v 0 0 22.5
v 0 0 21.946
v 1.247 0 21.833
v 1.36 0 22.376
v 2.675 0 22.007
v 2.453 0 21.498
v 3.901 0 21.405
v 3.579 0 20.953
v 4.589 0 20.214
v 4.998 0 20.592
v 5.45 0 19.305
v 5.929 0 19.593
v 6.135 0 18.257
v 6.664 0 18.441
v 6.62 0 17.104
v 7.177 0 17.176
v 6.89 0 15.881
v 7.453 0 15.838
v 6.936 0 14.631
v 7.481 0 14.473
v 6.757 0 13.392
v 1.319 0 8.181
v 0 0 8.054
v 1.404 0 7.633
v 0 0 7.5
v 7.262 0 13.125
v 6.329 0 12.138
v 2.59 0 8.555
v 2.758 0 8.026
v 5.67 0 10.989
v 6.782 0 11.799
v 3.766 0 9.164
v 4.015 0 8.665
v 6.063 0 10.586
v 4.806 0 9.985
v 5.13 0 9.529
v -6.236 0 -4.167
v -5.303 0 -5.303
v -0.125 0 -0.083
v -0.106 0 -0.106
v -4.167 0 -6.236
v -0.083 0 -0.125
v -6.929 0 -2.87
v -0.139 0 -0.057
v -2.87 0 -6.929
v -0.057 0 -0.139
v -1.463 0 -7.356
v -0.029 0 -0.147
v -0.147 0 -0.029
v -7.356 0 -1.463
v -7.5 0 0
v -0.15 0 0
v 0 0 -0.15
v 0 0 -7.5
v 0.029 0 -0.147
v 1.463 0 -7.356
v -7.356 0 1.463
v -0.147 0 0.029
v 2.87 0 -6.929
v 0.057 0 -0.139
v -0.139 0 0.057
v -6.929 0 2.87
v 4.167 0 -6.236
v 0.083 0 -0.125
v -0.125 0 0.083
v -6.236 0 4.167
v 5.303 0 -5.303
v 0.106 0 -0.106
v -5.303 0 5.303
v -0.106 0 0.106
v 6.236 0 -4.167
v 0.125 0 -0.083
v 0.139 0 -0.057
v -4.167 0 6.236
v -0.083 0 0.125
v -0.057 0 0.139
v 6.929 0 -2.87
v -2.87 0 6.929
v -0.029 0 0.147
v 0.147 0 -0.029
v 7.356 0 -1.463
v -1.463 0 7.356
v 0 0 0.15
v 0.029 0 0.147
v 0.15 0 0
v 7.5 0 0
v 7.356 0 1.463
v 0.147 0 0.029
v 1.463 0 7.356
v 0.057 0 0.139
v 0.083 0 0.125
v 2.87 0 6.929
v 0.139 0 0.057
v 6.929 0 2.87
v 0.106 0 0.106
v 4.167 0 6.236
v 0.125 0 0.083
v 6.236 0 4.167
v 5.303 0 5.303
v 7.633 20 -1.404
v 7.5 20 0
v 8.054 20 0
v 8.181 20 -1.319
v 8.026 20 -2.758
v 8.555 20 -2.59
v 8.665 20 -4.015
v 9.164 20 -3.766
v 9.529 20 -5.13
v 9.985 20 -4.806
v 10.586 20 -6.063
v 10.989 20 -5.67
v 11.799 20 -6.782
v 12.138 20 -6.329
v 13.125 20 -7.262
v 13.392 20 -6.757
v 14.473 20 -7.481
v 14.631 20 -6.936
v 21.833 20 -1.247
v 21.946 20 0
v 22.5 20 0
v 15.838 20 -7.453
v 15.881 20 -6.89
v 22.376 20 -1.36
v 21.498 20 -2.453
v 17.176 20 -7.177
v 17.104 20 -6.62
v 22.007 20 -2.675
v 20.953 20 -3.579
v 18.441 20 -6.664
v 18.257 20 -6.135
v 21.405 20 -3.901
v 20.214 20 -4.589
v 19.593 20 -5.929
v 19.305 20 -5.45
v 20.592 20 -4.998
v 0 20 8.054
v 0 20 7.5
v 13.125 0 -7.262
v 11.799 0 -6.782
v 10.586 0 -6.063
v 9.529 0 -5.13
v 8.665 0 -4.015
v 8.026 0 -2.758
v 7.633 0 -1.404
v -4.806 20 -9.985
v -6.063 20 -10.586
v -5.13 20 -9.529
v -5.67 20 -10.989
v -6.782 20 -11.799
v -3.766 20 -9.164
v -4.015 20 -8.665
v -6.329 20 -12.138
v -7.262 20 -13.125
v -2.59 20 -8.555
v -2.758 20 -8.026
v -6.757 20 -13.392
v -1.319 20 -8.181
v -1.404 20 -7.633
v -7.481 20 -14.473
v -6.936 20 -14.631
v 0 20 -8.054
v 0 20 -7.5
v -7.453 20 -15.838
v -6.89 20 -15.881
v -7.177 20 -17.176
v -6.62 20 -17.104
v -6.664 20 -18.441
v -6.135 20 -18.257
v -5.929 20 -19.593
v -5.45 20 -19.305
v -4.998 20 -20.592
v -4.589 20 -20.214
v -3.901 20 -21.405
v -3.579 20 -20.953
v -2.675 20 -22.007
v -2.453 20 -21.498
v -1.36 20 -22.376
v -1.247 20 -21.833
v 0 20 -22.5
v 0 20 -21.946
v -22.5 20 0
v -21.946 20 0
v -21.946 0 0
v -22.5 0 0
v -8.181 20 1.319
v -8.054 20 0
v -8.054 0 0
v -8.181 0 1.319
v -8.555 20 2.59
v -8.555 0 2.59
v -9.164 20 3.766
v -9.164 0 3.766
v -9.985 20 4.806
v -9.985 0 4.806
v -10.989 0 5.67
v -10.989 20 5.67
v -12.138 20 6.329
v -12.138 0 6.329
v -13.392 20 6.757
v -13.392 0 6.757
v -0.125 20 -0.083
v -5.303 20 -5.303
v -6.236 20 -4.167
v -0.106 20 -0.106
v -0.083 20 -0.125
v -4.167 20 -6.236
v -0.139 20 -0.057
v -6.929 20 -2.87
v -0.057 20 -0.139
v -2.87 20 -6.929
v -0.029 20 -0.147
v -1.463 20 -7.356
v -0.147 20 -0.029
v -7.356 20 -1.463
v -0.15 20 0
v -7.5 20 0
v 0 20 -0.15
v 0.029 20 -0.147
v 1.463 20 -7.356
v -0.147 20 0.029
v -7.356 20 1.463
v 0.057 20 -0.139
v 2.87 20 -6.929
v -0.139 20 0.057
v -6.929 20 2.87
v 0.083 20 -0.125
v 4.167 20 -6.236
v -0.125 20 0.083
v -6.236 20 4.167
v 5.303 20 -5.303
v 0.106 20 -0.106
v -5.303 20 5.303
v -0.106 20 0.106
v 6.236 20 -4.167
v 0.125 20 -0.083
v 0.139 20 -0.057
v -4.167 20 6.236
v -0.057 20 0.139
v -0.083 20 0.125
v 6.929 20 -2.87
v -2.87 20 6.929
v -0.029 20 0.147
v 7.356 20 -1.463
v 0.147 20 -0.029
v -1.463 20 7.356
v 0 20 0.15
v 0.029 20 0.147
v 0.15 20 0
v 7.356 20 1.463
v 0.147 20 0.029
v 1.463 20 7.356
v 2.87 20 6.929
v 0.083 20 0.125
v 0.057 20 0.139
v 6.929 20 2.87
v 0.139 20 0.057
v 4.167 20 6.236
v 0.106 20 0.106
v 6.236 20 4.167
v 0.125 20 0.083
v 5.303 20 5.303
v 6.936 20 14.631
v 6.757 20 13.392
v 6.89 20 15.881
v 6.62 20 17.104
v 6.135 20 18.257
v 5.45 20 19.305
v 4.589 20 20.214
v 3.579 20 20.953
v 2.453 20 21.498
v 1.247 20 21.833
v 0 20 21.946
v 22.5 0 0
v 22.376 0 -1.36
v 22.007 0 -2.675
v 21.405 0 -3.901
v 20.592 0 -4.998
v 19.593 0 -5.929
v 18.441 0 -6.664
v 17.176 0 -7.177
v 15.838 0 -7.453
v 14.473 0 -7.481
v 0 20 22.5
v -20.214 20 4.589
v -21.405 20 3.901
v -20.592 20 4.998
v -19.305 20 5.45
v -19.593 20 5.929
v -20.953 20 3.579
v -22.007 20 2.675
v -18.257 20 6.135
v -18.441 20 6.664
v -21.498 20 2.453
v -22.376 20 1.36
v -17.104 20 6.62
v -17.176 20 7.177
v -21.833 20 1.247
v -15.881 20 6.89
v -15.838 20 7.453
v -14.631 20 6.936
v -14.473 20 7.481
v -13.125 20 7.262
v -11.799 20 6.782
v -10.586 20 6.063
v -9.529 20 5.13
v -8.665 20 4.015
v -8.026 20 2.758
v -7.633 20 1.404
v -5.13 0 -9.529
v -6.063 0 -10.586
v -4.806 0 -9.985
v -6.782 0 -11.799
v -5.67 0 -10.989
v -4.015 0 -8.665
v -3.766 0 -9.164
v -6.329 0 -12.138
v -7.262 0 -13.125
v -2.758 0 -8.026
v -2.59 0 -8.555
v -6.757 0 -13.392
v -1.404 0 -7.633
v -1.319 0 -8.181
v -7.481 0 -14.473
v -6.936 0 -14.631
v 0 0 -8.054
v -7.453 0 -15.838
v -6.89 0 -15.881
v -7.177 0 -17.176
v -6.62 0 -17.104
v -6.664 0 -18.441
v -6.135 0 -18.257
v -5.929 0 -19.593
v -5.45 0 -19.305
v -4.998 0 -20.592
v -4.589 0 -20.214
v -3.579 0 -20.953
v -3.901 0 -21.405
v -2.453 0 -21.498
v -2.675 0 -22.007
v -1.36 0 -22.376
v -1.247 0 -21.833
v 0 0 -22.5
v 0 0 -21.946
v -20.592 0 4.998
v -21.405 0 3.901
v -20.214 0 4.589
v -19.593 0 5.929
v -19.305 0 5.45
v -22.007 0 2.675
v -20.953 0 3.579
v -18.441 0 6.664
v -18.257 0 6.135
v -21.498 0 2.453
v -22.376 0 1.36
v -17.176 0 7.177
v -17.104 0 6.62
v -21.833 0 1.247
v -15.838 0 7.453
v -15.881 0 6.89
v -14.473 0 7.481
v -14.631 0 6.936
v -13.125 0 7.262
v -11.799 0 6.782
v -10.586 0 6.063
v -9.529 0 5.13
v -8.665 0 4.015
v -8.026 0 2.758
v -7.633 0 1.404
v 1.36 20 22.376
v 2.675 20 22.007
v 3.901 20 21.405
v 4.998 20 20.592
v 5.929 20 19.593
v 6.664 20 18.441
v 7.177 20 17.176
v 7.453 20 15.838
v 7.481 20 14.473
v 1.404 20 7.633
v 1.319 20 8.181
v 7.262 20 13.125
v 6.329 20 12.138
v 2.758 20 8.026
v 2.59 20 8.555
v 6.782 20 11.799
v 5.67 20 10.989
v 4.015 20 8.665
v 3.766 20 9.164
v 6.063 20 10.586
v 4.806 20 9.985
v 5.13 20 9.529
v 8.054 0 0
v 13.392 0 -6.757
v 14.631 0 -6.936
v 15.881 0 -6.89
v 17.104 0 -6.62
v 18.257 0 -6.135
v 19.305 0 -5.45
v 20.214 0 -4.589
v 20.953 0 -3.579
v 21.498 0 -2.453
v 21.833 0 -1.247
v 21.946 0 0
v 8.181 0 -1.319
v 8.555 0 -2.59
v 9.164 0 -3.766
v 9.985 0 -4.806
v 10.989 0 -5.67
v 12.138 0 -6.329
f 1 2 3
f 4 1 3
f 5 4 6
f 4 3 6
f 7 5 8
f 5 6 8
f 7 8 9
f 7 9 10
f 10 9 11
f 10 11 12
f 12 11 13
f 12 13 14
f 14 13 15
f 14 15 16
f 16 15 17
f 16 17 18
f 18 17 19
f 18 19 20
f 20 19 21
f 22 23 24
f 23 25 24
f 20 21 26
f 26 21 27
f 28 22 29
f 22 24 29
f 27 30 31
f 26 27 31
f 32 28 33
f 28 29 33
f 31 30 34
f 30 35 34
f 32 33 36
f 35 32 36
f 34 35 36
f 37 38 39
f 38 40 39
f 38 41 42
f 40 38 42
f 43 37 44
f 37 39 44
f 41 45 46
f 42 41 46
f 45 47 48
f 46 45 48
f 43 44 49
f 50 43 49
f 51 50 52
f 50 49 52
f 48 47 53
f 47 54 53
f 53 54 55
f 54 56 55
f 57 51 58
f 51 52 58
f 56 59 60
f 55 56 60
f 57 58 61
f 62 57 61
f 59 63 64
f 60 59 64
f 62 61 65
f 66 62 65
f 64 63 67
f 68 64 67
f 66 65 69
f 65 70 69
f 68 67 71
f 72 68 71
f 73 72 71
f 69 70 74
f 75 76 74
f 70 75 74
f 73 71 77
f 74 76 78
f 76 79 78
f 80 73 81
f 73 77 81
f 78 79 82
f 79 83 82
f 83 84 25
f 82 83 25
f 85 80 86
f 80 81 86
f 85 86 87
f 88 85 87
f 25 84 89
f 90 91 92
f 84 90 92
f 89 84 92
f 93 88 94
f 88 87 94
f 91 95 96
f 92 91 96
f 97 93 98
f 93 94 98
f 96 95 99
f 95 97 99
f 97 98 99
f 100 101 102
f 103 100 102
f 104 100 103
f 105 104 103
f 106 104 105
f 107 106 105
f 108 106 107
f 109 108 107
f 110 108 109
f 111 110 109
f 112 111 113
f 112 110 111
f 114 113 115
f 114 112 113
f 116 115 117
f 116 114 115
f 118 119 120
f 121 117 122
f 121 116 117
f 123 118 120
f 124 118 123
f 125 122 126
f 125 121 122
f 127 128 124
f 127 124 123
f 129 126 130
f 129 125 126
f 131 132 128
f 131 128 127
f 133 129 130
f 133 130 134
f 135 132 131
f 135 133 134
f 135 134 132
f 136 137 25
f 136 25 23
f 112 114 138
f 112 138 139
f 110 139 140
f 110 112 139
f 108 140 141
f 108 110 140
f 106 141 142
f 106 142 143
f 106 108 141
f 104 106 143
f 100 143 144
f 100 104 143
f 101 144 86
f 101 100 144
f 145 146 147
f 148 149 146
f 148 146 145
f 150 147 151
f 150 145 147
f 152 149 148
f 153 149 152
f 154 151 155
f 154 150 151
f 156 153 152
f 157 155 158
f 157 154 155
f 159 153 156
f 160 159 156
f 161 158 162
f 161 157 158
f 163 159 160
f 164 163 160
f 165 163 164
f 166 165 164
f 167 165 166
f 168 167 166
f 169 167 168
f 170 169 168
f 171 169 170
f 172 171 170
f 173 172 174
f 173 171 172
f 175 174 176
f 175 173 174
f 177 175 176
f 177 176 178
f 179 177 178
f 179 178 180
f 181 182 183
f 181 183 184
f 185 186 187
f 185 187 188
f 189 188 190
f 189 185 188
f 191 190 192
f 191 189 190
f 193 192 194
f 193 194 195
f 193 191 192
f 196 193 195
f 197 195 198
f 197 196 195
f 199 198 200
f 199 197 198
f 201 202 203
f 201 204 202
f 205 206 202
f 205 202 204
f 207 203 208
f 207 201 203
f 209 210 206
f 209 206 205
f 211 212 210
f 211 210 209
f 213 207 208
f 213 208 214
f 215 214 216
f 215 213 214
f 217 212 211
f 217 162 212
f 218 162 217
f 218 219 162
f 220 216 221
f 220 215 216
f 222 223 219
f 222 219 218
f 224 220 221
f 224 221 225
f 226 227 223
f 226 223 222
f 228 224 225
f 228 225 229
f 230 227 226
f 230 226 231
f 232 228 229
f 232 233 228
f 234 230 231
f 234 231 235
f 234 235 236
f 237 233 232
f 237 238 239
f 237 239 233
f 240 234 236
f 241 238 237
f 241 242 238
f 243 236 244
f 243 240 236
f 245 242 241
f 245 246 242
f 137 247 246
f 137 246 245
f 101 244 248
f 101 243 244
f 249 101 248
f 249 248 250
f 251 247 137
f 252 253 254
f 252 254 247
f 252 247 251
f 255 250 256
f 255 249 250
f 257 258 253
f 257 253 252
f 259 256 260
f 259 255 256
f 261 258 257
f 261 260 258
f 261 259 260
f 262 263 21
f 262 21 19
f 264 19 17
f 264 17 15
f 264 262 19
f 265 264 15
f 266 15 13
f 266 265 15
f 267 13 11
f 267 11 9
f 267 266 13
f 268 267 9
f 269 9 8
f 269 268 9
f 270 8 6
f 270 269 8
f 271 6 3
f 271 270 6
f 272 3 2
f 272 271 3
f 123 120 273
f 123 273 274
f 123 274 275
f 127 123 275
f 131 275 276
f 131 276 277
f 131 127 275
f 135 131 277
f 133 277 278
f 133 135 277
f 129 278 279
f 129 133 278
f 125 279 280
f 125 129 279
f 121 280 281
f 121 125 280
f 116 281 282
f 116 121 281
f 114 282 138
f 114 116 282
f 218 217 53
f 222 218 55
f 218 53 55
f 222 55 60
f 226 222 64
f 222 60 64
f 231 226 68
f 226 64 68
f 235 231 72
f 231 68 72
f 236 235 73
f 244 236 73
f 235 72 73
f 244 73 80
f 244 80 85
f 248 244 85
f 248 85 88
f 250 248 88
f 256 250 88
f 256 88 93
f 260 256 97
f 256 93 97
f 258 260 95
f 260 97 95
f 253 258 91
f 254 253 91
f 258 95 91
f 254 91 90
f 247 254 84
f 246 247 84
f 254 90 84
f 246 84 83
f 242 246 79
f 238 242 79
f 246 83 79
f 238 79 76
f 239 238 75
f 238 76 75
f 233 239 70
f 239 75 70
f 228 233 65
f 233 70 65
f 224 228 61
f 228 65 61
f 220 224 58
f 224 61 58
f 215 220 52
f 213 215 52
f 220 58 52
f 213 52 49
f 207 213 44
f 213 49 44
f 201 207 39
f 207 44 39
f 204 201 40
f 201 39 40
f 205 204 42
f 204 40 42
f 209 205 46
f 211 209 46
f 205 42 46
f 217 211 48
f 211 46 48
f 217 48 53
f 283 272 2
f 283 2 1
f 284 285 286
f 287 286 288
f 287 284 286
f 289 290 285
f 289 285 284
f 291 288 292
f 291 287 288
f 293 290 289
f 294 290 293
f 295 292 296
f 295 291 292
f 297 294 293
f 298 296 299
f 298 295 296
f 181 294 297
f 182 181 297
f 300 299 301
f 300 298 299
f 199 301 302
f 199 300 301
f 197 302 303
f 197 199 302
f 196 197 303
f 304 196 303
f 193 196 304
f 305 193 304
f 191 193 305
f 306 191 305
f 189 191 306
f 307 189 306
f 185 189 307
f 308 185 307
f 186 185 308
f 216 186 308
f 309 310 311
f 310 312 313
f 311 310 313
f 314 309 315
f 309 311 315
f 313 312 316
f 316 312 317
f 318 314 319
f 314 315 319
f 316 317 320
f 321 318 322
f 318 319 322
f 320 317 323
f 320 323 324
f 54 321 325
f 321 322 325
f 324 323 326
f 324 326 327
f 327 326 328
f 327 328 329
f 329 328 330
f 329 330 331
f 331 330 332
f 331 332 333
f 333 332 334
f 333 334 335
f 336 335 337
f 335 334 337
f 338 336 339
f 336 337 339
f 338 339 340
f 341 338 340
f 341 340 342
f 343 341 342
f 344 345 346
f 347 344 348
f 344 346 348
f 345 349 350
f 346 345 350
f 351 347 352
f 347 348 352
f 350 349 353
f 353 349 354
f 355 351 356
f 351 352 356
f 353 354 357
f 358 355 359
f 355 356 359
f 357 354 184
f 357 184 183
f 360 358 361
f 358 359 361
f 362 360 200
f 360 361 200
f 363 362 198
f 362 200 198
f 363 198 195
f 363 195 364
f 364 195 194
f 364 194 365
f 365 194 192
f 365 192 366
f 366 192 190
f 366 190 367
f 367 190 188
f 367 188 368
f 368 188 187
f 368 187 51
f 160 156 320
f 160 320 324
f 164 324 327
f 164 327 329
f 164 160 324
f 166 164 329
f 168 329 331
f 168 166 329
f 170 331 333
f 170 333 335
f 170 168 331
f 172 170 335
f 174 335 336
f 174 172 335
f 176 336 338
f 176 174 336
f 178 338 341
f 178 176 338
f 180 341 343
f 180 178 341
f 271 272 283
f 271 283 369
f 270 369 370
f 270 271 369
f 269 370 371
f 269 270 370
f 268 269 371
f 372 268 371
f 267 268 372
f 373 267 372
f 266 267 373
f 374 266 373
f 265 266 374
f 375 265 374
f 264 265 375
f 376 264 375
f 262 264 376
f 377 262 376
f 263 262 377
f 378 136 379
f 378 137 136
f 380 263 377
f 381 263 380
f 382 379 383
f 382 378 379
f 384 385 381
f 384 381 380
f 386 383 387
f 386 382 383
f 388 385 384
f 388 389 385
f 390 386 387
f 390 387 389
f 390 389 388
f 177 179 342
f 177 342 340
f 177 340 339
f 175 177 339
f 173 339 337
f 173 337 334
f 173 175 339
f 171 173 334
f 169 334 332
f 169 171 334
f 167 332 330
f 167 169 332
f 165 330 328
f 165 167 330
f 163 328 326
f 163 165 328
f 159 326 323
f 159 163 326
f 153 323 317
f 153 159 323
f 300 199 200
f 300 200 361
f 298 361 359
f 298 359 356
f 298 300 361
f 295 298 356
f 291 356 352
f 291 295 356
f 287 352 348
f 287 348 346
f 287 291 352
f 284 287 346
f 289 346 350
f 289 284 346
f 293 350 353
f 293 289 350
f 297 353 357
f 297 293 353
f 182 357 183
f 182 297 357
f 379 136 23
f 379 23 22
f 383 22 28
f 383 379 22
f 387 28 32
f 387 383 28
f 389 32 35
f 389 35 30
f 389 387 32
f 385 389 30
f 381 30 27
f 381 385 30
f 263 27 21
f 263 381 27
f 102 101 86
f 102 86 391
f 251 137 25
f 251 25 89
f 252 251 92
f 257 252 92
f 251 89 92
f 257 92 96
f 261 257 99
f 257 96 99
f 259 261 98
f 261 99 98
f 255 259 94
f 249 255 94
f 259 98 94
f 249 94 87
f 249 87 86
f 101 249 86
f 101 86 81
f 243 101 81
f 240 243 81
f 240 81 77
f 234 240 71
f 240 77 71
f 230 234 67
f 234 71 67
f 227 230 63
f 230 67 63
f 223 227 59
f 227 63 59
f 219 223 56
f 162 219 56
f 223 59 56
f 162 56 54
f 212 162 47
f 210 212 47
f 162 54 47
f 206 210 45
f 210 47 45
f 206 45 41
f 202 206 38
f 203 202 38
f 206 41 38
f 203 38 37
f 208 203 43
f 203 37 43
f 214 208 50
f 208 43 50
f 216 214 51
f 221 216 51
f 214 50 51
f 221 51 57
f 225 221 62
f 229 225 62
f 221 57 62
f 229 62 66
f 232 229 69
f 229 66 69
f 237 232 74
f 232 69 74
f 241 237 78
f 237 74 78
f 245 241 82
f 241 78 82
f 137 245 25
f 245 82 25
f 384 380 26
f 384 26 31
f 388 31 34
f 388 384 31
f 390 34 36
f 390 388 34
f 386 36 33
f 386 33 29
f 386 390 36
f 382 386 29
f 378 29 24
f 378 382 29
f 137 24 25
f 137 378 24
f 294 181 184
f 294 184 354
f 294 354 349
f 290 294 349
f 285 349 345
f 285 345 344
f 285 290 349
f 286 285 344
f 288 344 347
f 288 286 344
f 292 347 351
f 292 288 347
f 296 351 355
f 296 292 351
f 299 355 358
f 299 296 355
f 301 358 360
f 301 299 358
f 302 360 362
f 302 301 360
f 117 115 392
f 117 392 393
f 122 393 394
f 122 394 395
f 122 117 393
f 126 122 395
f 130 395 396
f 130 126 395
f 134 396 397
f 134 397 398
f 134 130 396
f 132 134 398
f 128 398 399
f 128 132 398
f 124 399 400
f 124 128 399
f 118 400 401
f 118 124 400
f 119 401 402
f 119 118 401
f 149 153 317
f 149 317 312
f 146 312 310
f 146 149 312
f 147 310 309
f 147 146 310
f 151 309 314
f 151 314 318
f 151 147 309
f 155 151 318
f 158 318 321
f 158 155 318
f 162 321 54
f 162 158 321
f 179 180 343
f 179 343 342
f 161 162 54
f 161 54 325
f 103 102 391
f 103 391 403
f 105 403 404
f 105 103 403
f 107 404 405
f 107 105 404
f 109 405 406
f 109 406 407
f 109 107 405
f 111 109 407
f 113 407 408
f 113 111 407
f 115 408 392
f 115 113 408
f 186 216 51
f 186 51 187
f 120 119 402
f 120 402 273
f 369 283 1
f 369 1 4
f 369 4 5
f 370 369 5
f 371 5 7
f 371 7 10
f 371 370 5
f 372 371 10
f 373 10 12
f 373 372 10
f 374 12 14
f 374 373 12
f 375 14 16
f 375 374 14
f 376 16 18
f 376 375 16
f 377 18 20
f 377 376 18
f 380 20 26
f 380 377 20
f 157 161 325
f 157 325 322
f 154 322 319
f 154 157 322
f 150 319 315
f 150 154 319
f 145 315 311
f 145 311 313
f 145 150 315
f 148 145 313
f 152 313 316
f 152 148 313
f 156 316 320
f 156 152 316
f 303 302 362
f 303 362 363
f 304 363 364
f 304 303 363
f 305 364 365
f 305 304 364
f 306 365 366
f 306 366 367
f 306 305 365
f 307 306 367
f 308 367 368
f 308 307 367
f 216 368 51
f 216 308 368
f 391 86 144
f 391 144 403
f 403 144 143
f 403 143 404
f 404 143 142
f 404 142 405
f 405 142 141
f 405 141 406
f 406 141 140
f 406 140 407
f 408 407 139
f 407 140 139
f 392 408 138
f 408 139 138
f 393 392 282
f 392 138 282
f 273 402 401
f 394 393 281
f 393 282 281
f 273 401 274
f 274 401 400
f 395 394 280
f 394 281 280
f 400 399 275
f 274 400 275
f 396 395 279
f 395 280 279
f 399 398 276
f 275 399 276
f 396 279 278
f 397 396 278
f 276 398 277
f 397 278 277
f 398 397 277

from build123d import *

# Parameters (mm, degrees)
SKETCH1_R           = 7.5
BOSS_EXTRUDE1_DEPTH = 20
SKETCH2_R           = 0.15
CUT_EXTRUDE2_DEPTH  = 20
BOSS_EXTRUDE3_DEPTH = 20


with BuildPart() as part:
    # Sketch1 → Boss-Extrude1 (new body)
    with BuildSketch(Plane(origin=(0, 0, 0), x_dir=(1, 0, 0), z_dir=(0, 1, 0))):
        with Locations(Location((0, 0, 0), (0, 0, 270))):
            Circle(SKETCH1_R)
    extrude(amount=BOSS_EXTRUDE1_DEPTH)

    # Sketch2 → Cut-Extrude2 (cut)
    with BuildSketch(Plane.XZ):
        with Locations(Location((0, 0, 0), (0, 0, 270))):
            Circle(SKETCH2_R)
    extrude(amount=-CUT_EXTRUDE2_DEPTH, mode=Mode.SUBTRACT)


with BuildPart() as body_2:
    # Sketch4 → Boss-Extrude3 (new body)
    with BuildSketch(Plane(origin=(0, 20, 0), x_dir=(1, 0, 0), z_dir=(0, 1, 0))):
        with BuildLine():
            Line((0, 21.945820884), (0, 22.5))
            ThreePointArc((0, 22.5), (-5.929270613, 19.592793268), (-7.261843774, 13.125))
            ThreePointArc((-7.261843774, 13.125), (-7.010737546, 13.260827993), (-6.757091762, 13.391852408))
            ThreePointArc((-6.757091762, 13.391852408), (-5.450428097, 19.305491994), (0, 21.945820884))
        make_face()
        with BuildLine():
            ThreePointArc((-6.757091762, 13.391852408), (-7.010737546, 13.260827993), (-7.261843774, 13.125))
            ThreePointArc((-7.261843774, 13.125), (-4.592793268, 9.070729387), (0, 7.5))
            Line((0, 7.5), (0, 8.054179116))
            ThreePointArc((0, 8.054179116), (-4.305491994, 9.549571903), (-6.757091762, 13.391852408))
        make_face()
        with BuildLine():
            ThreePointArc((-8.054179116, 0), (-9.549571903, -4.305491994), (-13.391852408, -6.757091762))
            ThreePointArc((-13.391852408, -6.757091762), (-13.260827993, -7.010737546), (-13.125, -7.261843774))
            ThreePointArc((-13.125, -7.261843774), (-9.070729387, -4.592793268), (-7.5, 0))
            Line((-7.5, 0), (-8.054179116, 0))
        make_face()
        with BuildLine():
            ThreePointArc((-13.125, -7.261843774), (-13.260827993, -7.010737546), (-13.391852408, -6.757091762))
            ThreePointArc((-13.391852408, -6.757091762), (-19.305491994, -5.450428097), (-21.945820884, 0))
            Line((-21.945820884, 0), (-22.5, 0))
            ThreePointArc((-22.5, 0), (-19.592793268, -5.929270613), (-13.125, -7.261843774))
        make_face()
        with BuildLine():
            ThreePointArc((0, -8.054179116), (4.305491994, -9.549571903), (6.757091762, -13.391852408))
            ThreePointArc((6.757091762, -13.391852408), (7.010737546, -13.260827993), (7.261843774, -13.125))
            ThreePointArc((7.261843774, -13.125), (4.592793268, -9.070729387), (0, -7.5))
            Line((0, -7.5), (0, -8.054179116))
        make_face()
        with BuildLine():
            ThreePointArc((7.261843774, -13.125), (7.010737546, -13.260827993), (6.757091762, -13.391852408))
            ThreePointArc((6.757091762, -13.391852408), (5.450428097, -19.305491994), (0, -21.945820884))
            Line((0, -21.945820884), (0, -22.5))
            ThreePointArc((0, -22.5), (5.929270613, -19.592793268), (7.261843774, -13.125))
        make_face()
        with BuildLine():
            ThreePointArc((13.391852408, 6.757091762), (13.260827993, 7.010737546), (13.125, 7.261843774))
            ThreePointArc((13.125, 7.261843774), (9.070729387, 4.592793268), (7.5, 0))
            Line((7.5, 0), (8.054179116, 0))
            ThreePointArc((8.054179116, 0), (9.549571903, 4.305491994), (13.391852408, 6.757091762))
        make_face()
        with BuildLine():
            ThreePointArc((22.5, 0), (19.592793268, 5.929270613), (13.125, 7.261843774))
            ThreePointArc((13.125, 7.261843774), (13.260827993, 7.010737546), (13.391852408, 6.757091762))
            ThreePointArc((13.391852408, 6.757091762), (19.305491994, 5.450428097), (21.945820884, 0))
            Line((21.945820884, 0), (22.5, 0))
        make_face()
    extrude(amount=-BOSS_EXTRUDE3_DEPTH)


solid = Compound([part.part, body_2.part])
